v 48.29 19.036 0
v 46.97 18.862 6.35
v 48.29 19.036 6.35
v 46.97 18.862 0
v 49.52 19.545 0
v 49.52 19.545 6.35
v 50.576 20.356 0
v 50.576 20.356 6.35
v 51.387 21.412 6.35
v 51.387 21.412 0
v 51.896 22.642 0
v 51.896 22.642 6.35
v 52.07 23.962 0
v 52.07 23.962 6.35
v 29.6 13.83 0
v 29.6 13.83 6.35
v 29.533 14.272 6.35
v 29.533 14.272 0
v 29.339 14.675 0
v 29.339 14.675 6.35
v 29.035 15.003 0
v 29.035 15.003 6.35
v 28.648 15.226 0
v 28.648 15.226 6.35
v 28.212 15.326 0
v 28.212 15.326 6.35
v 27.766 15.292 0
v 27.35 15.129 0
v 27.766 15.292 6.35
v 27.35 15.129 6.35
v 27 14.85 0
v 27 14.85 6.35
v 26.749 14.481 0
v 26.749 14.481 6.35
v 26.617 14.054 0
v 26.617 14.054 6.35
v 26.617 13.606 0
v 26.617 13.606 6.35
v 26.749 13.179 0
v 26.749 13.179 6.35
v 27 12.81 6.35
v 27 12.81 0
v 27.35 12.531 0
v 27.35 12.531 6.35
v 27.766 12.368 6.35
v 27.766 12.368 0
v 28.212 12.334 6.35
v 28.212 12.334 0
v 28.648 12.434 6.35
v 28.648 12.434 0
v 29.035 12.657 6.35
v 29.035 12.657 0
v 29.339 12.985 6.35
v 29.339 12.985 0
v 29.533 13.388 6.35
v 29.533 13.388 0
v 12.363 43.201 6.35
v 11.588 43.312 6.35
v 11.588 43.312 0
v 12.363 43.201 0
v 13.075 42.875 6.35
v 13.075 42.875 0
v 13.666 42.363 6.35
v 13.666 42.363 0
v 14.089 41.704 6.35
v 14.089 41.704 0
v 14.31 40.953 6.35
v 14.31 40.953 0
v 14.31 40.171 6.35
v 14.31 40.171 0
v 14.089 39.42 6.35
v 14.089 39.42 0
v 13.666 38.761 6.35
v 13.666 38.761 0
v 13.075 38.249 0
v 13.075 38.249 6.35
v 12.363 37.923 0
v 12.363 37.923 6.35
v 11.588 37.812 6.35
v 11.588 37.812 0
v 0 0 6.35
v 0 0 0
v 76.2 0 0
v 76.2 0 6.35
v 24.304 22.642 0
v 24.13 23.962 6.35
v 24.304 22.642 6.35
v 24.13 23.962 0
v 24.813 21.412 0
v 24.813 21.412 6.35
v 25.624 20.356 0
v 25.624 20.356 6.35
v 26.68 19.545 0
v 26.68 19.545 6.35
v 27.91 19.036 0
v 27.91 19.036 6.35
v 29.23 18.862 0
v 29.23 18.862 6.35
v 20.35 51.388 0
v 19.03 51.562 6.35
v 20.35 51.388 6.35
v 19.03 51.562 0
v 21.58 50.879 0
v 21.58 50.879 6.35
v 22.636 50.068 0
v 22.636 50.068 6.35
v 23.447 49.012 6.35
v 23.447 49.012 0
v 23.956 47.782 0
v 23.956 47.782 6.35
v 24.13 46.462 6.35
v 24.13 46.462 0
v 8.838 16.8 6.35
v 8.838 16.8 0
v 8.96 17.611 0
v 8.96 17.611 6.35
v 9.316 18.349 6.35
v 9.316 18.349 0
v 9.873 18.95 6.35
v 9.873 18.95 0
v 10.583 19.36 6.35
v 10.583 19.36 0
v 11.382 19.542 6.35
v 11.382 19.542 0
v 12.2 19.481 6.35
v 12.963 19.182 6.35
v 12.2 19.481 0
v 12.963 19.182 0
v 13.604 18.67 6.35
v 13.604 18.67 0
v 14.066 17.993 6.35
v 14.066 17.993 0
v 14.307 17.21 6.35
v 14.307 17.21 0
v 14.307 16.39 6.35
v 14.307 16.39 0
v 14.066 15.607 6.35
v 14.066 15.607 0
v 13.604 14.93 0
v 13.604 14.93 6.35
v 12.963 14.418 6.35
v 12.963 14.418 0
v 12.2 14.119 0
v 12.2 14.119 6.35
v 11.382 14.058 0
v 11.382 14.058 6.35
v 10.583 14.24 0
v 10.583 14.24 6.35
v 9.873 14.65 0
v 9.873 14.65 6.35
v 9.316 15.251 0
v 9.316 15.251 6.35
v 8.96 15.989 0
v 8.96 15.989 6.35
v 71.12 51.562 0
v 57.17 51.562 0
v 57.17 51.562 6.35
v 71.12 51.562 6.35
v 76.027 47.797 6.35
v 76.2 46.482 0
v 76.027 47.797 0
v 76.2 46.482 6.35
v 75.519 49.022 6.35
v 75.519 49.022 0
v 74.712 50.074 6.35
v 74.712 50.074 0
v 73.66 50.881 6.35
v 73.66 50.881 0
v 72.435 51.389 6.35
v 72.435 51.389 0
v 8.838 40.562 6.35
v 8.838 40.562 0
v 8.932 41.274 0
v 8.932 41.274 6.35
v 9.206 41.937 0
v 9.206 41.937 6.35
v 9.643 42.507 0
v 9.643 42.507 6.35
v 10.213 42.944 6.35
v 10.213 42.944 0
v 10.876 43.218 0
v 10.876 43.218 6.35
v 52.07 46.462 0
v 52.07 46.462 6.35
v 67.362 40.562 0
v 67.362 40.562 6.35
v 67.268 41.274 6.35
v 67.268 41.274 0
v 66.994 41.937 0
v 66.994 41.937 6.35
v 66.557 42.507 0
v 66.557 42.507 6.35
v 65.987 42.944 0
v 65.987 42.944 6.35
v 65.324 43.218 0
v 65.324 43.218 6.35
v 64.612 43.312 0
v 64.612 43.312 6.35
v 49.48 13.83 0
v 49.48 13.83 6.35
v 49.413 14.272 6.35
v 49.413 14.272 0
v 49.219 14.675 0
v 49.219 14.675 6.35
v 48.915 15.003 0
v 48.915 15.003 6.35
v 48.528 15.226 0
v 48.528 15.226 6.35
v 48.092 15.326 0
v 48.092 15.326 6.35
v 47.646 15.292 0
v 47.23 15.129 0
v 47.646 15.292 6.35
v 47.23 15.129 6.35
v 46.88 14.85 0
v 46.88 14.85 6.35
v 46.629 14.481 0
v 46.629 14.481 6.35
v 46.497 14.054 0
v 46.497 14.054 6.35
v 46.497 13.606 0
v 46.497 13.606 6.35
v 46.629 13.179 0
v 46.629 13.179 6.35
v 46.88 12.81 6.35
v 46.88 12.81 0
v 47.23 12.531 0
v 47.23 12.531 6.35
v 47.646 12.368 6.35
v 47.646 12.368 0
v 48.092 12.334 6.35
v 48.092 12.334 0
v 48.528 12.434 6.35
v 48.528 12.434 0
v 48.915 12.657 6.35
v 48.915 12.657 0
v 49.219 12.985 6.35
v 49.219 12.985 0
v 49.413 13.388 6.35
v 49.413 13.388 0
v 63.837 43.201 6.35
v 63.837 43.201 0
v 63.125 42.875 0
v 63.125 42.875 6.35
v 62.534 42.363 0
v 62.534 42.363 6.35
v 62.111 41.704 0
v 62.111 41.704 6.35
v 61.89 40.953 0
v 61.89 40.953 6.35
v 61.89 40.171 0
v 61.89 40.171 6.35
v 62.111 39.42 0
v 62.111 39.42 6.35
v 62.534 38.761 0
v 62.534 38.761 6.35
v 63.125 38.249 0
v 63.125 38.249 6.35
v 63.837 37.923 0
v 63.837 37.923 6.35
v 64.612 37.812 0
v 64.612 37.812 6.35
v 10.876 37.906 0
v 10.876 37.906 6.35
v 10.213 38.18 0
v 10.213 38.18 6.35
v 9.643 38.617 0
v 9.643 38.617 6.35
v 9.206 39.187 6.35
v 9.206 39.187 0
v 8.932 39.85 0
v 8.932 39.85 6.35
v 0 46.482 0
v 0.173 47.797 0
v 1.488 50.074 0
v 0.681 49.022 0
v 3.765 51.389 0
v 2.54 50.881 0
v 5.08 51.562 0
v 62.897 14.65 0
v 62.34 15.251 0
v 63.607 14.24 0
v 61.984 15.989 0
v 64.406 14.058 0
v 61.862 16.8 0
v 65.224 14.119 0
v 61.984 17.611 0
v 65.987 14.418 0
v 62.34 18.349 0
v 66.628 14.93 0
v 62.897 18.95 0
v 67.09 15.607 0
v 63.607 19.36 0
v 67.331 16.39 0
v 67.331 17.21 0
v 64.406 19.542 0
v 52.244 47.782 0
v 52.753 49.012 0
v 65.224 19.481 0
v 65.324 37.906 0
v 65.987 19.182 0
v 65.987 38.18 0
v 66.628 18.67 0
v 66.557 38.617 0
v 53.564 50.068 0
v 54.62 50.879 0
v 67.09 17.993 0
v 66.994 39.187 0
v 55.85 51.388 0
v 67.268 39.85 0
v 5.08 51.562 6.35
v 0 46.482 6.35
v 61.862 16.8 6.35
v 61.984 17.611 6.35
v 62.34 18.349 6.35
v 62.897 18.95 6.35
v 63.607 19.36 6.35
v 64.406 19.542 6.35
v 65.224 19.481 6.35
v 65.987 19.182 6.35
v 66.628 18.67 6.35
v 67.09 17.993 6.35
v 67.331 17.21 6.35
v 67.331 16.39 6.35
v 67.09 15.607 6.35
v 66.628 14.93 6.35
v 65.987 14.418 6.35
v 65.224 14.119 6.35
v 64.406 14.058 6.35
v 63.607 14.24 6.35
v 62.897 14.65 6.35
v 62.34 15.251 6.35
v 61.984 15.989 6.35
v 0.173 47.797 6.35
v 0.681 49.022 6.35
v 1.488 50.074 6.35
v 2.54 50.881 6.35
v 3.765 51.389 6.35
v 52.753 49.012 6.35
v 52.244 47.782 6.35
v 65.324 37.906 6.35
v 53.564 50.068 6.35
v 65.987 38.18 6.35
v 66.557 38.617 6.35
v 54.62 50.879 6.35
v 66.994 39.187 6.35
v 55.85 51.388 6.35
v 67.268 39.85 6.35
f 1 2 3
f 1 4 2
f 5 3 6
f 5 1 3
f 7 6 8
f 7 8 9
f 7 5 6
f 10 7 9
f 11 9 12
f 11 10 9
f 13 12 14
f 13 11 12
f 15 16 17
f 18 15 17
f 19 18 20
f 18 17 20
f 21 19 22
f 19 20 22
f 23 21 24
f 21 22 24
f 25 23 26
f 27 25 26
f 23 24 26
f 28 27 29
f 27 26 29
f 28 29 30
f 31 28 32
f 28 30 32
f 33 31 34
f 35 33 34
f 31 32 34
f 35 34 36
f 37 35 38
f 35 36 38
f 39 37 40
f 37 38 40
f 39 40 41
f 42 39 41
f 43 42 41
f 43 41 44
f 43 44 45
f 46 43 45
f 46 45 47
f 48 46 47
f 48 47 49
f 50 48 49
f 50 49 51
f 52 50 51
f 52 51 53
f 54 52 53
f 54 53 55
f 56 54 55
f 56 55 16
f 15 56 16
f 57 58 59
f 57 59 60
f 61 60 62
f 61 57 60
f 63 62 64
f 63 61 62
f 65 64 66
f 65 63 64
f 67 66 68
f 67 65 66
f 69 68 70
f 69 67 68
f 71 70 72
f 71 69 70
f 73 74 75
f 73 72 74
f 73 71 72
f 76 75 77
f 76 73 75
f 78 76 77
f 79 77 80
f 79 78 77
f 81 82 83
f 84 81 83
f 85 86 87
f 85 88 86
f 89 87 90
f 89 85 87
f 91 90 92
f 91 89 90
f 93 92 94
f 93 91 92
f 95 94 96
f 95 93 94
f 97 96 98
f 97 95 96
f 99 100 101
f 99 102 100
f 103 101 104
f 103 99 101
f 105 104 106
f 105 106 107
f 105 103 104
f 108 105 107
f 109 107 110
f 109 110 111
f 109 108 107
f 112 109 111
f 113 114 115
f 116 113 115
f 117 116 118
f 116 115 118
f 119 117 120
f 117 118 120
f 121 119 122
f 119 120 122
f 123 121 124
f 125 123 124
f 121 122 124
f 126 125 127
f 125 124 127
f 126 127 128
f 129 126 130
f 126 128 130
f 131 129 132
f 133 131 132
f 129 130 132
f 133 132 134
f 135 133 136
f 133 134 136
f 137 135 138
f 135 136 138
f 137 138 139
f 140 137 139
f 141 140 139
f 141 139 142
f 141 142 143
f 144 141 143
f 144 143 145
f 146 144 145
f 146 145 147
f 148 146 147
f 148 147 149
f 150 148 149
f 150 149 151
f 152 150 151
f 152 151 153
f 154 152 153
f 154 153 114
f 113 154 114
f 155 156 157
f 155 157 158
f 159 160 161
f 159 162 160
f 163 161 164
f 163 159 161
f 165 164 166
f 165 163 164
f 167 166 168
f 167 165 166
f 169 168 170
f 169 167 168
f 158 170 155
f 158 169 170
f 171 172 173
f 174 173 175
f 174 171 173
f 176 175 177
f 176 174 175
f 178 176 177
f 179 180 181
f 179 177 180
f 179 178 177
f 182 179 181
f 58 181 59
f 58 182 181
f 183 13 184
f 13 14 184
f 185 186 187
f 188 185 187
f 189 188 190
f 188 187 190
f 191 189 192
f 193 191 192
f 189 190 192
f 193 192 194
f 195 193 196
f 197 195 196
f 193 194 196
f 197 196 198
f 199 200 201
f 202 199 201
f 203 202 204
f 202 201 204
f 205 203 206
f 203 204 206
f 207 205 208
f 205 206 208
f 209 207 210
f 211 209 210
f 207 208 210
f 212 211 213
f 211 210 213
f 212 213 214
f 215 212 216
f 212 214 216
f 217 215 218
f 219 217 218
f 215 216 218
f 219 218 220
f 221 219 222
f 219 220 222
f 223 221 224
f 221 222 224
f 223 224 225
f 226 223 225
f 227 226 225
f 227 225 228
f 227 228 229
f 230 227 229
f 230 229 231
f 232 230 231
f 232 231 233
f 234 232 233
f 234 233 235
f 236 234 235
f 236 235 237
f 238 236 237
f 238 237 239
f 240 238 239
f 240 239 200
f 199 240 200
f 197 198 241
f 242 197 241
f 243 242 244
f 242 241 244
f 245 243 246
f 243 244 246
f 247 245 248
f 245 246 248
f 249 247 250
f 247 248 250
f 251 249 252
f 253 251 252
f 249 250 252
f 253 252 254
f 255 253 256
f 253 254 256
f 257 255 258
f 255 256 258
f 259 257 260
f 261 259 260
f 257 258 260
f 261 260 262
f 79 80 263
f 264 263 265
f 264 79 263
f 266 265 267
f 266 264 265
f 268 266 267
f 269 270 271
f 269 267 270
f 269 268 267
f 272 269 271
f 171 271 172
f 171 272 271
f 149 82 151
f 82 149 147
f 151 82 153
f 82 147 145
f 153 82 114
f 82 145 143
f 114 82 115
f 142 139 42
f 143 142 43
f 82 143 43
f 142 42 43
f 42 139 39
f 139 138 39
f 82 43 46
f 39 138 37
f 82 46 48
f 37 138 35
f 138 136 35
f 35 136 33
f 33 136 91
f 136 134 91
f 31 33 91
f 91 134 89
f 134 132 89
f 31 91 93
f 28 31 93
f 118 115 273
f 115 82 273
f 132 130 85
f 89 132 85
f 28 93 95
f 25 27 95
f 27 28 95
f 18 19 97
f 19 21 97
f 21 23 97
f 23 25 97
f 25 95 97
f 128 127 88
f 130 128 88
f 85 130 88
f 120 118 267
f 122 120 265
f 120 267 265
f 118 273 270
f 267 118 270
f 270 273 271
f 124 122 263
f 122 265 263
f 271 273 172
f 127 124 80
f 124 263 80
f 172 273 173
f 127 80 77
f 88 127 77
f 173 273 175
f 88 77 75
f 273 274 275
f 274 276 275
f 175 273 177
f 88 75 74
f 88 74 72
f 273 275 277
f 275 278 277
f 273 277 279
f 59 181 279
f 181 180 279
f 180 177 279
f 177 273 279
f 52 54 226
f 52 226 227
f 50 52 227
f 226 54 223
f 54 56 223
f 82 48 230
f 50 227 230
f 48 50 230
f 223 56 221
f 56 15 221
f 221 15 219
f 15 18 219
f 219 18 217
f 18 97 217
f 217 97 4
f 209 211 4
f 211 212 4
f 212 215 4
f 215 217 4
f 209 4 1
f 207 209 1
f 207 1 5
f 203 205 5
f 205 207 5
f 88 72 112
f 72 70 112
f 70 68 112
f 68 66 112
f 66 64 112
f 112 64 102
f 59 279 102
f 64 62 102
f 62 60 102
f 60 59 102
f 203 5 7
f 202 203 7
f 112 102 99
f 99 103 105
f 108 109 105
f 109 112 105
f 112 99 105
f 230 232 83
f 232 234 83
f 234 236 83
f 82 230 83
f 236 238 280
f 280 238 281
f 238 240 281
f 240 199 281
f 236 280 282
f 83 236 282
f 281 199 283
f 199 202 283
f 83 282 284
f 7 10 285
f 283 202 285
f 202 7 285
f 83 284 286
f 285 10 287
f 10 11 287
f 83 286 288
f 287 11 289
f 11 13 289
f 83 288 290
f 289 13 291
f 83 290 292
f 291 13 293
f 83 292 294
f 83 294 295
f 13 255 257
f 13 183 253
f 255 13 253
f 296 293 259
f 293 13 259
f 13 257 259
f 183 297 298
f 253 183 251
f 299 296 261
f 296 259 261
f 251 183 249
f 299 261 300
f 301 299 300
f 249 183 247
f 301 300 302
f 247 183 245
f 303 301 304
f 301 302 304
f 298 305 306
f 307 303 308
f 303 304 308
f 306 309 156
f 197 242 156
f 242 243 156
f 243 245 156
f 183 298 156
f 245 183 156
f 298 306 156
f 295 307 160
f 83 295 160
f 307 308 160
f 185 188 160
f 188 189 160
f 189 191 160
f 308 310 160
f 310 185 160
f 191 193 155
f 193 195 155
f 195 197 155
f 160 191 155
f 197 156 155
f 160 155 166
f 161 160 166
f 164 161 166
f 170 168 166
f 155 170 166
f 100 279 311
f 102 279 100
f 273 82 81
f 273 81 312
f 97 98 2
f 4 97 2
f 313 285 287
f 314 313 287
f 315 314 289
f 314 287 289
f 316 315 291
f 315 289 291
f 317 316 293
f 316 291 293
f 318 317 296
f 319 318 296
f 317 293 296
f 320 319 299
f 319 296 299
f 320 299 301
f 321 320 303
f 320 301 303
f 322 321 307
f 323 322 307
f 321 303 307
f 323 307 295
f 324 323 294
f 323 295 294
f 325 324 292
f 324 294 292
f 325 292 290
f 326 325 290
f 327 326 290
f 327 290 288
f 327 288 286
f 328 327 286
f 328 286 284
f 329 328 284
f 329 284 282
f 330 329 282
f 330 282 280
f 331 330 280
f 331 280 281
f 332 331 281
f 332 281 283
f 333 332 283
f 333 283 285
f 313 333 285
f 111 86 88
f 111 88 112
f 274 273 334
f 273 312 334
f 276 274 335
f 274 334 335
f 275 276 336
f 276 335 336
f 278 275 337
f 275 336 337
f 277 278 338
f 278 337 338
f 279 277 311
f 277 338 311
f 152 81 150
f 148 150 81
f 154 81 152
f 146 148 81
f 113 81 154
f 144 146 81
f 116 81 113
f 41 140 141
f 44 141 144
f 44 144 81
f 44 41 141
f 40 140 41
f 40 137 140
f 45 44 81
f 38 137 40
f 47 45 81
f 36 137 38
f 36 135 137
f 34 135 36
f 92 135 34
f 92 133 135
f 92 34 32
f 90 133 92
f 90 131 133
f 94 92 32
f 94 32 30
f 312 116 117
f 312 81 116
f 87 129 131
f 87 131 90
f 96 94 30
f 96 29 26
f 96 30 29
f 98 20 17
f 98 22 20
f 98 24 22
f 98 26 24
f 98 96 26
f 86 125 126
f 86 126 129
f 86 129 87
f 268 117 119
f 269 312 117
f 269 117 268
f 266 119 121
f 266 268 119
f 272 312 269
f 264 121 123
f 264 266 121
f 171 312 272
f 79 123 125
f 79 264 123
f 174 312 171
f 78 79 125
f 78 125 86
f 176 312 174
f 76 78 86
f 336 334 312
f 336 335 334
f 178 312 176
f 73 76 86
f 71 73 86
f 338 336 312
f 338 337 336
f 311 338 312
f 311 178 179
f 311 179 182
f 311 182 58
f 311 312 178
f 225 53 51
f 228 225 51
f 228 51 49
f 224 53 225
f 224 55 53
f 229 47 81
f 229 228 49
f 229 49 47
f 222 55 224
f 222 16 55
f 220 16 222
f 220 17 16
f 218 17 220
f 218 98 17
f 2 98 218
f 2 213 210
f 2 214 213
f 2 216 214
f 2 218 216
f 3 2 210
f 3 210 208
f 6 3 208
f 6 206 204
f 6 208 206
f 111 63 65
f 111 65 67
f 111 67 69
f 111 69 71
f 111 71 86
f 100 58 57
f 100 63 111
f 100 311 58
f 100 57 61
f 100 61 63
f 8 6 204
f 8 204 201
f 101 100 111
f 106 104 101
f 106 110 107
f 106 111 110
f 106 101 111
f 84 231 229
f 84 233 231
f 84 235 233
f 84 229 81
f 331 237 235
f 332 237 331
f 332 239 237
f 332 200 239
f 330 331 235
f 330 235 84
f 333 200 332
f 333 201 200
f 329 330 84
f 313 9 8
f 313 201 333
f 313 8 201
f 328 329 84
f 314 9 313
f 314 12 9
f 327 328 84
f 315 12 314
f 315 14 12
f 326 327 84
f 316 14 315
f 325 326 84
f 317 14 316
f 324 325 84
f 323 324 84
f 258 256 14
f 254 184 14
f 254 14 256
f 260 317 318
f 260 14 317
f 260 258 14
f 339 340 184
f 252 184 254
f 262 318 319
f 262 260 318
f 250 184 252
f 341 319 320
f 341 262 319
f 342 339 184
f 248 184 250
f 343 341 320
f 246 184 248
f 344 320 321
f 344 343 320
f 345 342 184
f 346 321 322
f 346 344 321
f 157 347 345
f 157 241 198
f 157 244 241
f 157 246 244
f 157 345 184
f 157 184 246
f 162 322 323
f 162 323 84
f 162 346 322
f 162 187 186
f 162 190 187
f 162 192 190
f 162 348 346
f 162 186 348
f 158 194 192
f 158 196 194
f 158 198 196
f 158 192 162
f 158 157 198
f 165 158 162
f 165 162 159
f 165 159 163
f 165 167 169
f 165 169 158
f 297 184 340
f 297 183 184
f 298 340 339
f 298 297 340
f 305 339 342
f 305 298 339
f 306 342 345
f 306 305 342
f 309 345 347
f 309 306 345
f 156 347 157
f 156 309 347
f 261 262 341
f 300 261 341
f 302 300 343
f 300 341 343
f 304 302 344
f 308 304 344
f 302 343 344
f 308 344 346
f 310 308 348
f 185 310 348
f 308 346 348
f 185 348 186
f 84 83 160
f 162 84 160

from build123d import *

# Parameters (mm, degrees)
SKETCH1_W           = 76.2
SKETCH1_H           = 51.562
BOSS_EXTRUDE1_DEPTH = 6.35
SKETCH2_W           = 27.94
SKETCH2_H           = 12.7
CUT_EXTRUDE1_DEPTH  = 9.906
FILLET1_R           = 5.08
SKETCH7_R           = 2.75
CUT_EXTRUDE2_DEPTH  = 127
CUT_EXTRUDE4_DEPTH  = 32.416
SKETCH9_W           = 27.94
SKETCH9_H           = 20
CUT_EXTRUDE5_DEPTH  = 18.7
FILLET2_R           = 5.1
SKETCH10_R          = 1.5
CUT_EXTRUDE6_DEPTH  = 10


with BuildPart() as part:
    # Sketch1 → Boss-Extrude1 (new body)
    with BuildSketch(Plane.XY):
        with Locations((38.1, 25.781)):
            Rectangle(SKETCH1_W, SKETCH1_H)
    extrude(amount=BOSS_EXTRUDE1_DEPTH)

    # Sketch2 → Cut-Extrude1 (cut)
    with BuildSketch(Plane.XY.offset(6.35)):
        with Locations((38.1, 45.212)):
            Rectangle(SKETCH2_W, SKETCH2_H)
    extrude(amount=-CUT_EXTRUDE1_DEPTH, mode=Mode.SUBTRACT)

    # Fillet1
    fillet1_edges = [part.edges().sort_by_distance(p)[0] for p in [
        (0, 51.562, 3.175),
        (76.2, 51.562, 3.175),
    ]]
    fillet(fillet1_edges, radius=FILLET1_R)

    # Sketch7 → Cut-Extrude2 (cut)
    with BuildSketch(Plane(origin=(0, 0, 0), x_dir=(-1, 0, 0), z_dir=(0, 0, -1))):
        with Locations((-11.588, 16.8)):
            Circle(SKETCH7_R)
        with Locations((-64.612, 16.8)):
            Circle(SKETCH7_R)
    extrude(amount=-CUT_EXTRUDE2_DEPTH, mode=Mode.SUBTRACT)

    # Sketch8 → Cut-Extrude4 (cut)
    with BuildSketch(Plane.XY.offset(6.35)):
        with BuildLine():
            ThreePointArc((64.612, 43.312), (61.862, 40.562), (64.612, 37.812))
            Line((64.612, 37.812), (64.612, 40.562))
            Line((64.612, 40.562), (64.612, 43.312))
        make_face()
        with BuildLine():
            Line((64.612, 40.562), (64.612, 37.812))
            ThreePointArc((64.612, 37.812), (66.556543648, 38.617456352), (67.362, 40.562))
            ThreePointArc((67.362, 40.562), (66.556543648, 42.506543648), (64.612, 43.312))
            Line((64.612, 43.312), (64.612, 40.562))
        make_face()
    cut_extrude4 = extrude(amount=-CUT_EXTRUDE4_DEPTH, mode=Mode.SUBTRACT)

    # Mirror2: Cut-Extrude4 across plane
    add(cut_extrude4.mirror(Plane.ZY.offset(-38.1)), mode=Mode.SUBTRACT)

    # Sketch9 → Cut-Extrude5 (cut)
    with BuildSketch(Plane.XY.offset(6.35)):
        with Locations((38.1, 28.862)):
            Rectangle(SKETCH9_W, SKETCH9_H)
    extrude(amount=-CUT_EXTRUDE5_DEPTH, mode=Mode.SUBTRACT)

    # Fillet2
    fillet2_edges = [part.edges().sort_by_distance(p)[0] for p in [
        (52.07, 51.562, 3.175),
        (24.13, 51.562, 3.175),
        (52.07, 18.862, 3.175),
        (24.13, 18.862, 3.175),
    ]]
    fillet(fillet2_edges, radius=FILLET2_R)

    # Sketch10 → Cut-Extrude6 (cut)
    with BuildSketch(Plane.XY.offset(6.35)):
        with Locations((47.98, 13.83)):
            Circle(SKETCH10_R)
        with Locations((28.1, 13.83)):
            Circle(SKETCH10_R)
    extrude(amount=-CUT_EXTRUDE6_DEPTH, mode=Mode.SUBTRACT)


solid = part.part
